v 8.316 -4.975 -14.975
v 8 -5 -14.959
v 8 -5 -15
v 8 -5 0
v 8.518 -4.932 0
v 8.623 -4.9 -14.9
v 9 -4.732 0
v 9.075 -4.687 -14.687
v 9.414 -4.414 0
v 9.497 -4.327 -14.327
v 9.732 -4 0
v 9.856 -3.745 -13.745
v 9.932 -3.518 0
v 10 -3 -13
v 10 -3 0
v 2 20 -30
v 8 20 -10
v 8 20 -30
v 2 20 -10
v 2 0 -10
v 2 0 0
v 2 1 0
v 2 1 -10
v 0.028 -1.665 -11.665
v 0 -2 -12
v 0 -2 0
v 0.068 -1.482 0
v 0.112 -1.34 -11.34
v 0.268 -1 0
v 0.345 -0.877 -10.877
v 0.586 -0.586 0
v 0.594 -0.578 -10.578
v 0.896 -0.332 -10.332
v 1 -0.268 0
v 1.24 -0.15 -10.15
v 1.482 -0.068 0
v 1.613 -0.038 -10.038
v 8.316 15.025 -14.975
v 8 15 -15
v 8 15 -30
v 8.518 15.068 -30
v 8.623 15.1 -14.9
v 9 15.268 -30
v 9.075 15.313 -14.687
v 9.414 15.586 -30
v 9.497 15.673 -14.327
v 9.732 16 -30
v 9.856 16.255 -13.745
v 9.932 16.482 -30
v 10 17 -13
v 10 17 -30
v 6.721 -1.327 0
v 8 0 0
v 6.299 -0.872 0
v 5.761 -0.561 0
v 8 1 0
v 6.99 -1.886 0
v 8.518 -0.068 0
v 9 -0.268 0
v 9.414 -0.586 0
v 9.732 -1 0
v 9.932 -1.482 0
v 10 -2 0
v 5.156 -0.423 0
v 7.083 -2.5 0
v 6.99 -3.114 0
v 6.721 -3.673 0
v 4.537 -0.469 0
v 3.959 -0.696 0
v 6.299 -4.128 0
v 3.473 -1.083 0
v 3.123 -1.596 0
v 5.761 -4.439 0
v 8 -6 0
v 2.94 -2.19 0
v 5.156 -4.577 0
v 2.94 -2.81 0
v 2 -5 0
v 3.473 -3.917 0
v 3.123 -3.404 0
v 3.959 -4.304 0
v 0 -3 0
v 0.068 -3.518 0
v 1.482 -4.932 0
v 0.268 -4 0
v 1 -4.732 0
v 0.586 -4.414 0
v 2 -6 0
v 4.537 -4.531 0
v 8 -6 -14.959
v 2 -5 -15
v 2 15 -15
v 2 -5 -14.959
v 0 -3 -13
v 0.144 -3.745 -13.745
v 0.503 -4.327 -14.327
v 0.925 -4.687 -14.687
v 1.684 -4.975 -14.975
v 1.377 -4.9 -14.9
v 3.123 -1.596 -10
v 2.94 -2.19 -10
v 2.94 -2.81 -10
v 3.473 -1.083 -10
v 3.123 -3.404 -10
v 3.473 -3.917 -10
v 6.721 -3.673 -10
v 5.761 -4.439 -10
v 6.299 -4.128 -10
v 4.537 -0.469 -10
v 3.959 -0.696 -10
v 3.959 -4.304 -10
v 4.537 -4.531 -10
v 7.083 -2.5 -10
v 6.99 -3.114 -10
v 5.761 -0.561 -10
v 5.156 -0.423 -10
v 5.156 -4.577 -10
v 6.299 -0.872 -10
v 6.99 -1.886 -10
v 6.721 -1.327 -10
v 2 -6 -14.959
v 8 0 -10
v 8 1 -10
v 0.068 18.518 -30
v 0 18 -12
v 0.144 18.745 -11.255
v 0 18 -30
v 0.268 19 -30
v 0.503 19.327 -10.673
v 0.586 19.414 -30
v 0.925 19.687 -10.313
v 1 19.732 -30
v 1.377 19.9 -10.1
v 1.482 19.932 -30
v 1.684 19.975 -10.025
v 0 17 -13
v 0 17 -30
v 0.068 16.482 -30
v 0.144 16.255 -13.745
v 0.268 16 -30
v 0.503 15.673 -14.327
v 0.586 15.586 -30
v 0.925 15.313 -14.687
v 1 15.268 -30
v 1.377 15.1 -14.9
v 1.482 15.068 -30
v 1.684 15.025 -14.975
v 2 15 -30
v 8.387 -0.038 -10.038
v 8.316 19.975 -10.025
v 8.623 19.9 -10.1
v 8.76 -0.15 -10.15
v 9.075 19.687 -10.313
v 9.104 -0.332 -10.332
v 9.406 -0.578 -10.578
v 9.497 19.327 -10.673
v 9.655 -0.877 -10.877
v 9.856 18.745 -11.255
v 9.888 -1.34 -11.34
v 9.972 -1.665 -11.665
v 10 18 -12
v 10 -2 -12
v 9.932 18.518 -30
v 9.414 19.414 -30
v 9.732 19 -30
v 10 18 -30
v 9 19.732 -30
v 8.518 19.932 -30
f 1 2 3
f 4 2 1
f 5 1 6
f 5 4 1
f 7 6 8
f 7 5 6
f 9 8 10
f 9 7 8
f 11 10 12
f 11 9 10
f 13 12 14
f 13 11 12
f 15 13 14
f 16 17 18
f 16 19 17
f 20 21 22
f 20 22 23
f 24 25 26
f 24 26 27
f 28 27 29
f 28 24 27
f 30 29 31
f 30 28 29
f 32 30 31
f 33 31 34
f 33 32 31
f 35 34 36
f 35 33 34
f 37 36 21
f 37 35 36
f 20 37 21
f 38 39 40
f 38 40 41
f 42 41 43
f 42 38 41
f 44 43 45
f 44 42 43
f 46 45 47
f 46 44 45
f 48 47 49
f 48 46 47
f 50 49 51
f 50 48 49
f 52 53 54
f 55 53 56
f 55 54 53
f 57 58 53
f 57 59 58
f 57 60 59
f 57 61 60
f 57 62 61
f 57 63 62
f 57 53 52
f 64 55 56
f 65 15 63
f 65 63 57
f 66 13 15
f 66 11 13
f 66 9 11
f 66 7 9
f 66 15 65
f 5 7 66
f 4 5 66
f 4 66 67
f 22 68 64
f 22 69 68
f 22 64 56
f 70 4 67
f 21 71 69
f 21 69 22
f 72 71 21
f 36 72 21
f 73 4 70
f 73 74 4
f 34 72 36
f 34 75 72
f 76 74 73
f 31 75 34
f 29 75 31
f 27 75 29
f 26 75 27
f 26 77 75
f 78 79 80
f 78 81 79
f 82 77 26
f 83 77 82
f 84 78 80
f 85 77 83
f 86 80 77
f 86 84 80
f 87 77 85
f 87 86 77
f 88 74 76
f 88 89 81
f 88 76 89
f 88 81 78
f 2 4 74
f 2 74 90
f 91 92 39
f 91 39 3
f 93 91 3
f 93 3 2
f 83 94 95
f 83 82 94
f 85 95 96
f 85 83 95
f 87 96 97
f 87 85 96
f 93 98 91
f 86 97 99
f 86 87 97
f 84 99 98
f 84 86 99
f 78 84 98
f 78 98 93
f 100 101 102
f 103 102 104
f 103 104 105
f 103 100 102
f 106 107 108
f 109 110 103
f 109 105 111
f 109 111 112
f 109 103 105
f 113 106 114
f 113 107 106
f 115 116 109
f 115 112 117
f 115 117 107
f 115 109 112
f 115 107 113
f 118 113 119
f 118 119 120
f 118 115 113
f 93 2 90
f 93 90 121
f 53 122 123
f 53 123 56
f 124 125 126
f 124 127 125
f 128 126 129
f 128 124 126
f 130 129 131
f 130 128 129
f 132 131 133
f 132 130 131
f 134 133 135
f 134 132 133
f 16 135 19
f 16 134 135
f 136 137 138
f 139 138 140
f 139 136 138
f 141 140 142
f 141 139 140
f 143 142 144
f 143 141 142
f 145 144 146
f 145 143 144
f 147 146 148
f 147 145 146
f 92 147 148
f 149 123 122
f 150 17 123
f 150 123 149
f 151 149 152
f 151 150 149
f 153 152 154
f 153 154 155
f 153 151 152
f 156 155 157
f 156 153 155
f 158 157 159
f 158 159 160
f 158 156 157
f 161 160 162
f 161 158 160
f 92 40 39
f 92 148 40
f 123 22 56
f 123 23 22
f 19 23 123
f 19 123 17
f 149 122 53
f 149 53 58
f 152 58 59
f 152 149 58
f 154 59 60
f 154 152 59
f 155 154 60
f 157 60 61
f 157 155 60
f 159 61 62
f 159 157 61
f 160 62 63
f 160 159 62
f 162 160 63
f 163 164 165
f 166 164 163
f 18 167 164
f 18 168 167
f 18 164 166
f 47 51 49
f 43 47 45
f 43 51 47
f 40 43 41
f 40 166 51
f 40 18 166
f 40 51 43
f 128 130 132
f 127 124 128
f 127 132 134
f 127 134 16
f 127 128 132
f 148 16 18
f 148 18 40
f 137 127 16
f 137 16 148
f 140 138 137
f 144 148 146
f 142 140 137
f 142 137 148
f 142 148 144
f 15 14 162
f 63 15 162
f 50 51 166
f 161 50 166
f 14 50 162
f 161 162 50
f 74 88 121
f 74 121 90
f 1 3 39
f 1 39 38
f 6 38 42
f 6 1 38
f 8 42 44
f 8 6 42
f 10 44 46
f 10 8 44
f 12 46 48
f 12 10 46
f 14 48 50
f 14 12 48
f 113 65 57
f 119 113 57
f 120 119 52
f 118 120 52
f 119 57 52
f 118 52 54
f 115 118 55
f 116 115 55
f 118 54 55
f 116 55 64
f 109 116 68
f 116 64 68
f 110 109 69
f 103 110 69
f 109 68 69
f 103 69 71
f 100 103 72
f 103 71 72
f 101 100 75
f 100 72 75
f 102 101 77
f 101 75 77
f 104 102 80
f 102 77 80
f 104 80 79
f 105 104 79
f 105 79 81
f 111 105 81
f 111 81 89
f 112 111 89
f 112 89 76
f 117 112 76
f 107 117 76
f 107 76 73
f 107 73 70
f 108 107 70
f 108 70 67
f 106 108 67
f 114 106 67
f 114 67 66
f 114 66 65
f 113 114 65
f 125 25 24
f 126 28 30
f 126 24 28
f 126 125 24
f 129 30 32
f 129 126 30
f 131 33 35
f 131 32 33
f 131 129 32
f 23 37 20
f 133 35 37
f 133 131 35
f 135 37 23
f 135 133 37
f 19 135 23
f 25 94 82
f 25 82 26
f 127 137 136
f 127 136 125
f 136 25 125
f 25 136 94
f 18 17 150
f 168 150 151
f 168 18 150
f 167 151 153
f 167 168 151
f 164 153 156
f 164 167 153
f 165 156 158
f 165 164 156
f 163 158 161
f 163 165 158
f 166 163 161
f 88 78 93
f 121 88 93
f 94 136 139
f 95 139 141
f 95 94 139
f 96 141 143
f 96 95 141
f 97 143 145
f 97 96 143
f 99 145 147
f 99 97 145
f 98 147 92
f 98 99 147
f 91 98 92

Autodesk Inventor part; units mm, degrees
ref_plane "YZ Plane" through (0, 0, 0) normal (1, 0, 0) x (0, 1, 0)
ref_plane "XZ Plane" through (0, 0, 0) normal (0, 1, 0) x (-1, 0, 0)
ref_plane "XY Plane" through (0, 0, 0) normal (0, 0, 1) x (1, 0, 0)
sketch "Sketch1" plane through (0, 0, 0) normal (1, 0, 0) x (0, 1, 0)
  line L0 (0, 0) -> (0, -10)
  line L1 (0, -10) -> (20, -10)
  line L2 (20, -10) -> (20, -30)
  line L3 (20, -30) -> (15, -30)
  line L4 (15, -30) -> (15, -15)
  line L5 (15, -15) -> (-5, -15)
  line L6 (-5, -15) -> (-5, 0)
  line L7 (-5, 0) -> (0, 0)
  dimension "d0" = 10
  dimension "d1" = 20
  dimension "d2" = 20
  dimension "d3" = 5
  dimension "d4" = 15
  dimension "d5" = 20
  dimension "d6" = 15
extrude "Extrusion1" add sketch "Sketch1" along normal blind 10
sketch "Sketch2" plane through (0, -5, 0) normal (0, 0, 1) x (1, 0, 0)
  line L0 (0, 0) -> (0, 5) projected
  line L1 (0, 5) -> (10, 5) projected
  point P0 (5, 2.5)
  dimension "d9" = 5
  dimension "d10" = 2.5
sketch "Sketch3" plane through (0, -5, 0) normal (0, 0, 1) x (1, 0, 0)
  circle A0 centre (5, 2.5) radius 2.0828
  line L0 (10, 5) -> (10, 0) projected
  line L1 (0, 5) -> (10, 5) projected
  dimension "d11" = 4.1656
  dimension "d12" = 5
  dimension "d13" = 2.5
extrude "Extrusion2" cut sketch "Sketch3" against normal blind 10
thread "Thread1" size "8-32 UNC" class "2B" standard "ANSI Unified Screw Threads" full length
fillet "Fillet1" radius 2 12 edges at (10, 20, -20) (0, 20, -20) (10, 0, -5) (0, 0, -5) (10, 15, -22.5) (10, -5, -7.5) (0, -5, -7.5) (0, 10, -10) (0, 5, -15) (10, 10, -10) (0, 15, -22.5) (10, 5, -15)
sketch "Sketch4" plane through (2, -5, -15) normal (0, -1, 0) x (1, 0, 0)
  line L0 (0, 15) -> (0, 5) projected
  line L1 (6, -15) -> (6, 5) projected
  line L2 (0, 15) -> (6, 15)
  line L3 (6, 15) -> (6, 0.0408)
  line L4 (6, 0.0408) -> (0, 0.0408)
  line L5 (0, 0.0408) -> (0, 15)
  point P0 (-2, 15)
extrude "Extrusion3" add sketch "Sketch4" along normal blind 1
sketch "Sketch5" plane through (2, 0, 0) normal (0, 1, 0) x (1, 0, 0)
  line L0 (6, 10) -> (6, 0) projected
  line L1 (0, 10) -> (6, 10) projected
  line L2 (6, 0) -> (0, 0)
  line L3 (0, 0) -> (0, 10)
  line L4 (0, 10) -> (6, 10)
  line L5 (6, 10) -> (6, 0)
  point P0 (-2, 0)
extrude "Extrusion4" add sketch "Sketch5" along normal blind 1
properties part number "Lever"
